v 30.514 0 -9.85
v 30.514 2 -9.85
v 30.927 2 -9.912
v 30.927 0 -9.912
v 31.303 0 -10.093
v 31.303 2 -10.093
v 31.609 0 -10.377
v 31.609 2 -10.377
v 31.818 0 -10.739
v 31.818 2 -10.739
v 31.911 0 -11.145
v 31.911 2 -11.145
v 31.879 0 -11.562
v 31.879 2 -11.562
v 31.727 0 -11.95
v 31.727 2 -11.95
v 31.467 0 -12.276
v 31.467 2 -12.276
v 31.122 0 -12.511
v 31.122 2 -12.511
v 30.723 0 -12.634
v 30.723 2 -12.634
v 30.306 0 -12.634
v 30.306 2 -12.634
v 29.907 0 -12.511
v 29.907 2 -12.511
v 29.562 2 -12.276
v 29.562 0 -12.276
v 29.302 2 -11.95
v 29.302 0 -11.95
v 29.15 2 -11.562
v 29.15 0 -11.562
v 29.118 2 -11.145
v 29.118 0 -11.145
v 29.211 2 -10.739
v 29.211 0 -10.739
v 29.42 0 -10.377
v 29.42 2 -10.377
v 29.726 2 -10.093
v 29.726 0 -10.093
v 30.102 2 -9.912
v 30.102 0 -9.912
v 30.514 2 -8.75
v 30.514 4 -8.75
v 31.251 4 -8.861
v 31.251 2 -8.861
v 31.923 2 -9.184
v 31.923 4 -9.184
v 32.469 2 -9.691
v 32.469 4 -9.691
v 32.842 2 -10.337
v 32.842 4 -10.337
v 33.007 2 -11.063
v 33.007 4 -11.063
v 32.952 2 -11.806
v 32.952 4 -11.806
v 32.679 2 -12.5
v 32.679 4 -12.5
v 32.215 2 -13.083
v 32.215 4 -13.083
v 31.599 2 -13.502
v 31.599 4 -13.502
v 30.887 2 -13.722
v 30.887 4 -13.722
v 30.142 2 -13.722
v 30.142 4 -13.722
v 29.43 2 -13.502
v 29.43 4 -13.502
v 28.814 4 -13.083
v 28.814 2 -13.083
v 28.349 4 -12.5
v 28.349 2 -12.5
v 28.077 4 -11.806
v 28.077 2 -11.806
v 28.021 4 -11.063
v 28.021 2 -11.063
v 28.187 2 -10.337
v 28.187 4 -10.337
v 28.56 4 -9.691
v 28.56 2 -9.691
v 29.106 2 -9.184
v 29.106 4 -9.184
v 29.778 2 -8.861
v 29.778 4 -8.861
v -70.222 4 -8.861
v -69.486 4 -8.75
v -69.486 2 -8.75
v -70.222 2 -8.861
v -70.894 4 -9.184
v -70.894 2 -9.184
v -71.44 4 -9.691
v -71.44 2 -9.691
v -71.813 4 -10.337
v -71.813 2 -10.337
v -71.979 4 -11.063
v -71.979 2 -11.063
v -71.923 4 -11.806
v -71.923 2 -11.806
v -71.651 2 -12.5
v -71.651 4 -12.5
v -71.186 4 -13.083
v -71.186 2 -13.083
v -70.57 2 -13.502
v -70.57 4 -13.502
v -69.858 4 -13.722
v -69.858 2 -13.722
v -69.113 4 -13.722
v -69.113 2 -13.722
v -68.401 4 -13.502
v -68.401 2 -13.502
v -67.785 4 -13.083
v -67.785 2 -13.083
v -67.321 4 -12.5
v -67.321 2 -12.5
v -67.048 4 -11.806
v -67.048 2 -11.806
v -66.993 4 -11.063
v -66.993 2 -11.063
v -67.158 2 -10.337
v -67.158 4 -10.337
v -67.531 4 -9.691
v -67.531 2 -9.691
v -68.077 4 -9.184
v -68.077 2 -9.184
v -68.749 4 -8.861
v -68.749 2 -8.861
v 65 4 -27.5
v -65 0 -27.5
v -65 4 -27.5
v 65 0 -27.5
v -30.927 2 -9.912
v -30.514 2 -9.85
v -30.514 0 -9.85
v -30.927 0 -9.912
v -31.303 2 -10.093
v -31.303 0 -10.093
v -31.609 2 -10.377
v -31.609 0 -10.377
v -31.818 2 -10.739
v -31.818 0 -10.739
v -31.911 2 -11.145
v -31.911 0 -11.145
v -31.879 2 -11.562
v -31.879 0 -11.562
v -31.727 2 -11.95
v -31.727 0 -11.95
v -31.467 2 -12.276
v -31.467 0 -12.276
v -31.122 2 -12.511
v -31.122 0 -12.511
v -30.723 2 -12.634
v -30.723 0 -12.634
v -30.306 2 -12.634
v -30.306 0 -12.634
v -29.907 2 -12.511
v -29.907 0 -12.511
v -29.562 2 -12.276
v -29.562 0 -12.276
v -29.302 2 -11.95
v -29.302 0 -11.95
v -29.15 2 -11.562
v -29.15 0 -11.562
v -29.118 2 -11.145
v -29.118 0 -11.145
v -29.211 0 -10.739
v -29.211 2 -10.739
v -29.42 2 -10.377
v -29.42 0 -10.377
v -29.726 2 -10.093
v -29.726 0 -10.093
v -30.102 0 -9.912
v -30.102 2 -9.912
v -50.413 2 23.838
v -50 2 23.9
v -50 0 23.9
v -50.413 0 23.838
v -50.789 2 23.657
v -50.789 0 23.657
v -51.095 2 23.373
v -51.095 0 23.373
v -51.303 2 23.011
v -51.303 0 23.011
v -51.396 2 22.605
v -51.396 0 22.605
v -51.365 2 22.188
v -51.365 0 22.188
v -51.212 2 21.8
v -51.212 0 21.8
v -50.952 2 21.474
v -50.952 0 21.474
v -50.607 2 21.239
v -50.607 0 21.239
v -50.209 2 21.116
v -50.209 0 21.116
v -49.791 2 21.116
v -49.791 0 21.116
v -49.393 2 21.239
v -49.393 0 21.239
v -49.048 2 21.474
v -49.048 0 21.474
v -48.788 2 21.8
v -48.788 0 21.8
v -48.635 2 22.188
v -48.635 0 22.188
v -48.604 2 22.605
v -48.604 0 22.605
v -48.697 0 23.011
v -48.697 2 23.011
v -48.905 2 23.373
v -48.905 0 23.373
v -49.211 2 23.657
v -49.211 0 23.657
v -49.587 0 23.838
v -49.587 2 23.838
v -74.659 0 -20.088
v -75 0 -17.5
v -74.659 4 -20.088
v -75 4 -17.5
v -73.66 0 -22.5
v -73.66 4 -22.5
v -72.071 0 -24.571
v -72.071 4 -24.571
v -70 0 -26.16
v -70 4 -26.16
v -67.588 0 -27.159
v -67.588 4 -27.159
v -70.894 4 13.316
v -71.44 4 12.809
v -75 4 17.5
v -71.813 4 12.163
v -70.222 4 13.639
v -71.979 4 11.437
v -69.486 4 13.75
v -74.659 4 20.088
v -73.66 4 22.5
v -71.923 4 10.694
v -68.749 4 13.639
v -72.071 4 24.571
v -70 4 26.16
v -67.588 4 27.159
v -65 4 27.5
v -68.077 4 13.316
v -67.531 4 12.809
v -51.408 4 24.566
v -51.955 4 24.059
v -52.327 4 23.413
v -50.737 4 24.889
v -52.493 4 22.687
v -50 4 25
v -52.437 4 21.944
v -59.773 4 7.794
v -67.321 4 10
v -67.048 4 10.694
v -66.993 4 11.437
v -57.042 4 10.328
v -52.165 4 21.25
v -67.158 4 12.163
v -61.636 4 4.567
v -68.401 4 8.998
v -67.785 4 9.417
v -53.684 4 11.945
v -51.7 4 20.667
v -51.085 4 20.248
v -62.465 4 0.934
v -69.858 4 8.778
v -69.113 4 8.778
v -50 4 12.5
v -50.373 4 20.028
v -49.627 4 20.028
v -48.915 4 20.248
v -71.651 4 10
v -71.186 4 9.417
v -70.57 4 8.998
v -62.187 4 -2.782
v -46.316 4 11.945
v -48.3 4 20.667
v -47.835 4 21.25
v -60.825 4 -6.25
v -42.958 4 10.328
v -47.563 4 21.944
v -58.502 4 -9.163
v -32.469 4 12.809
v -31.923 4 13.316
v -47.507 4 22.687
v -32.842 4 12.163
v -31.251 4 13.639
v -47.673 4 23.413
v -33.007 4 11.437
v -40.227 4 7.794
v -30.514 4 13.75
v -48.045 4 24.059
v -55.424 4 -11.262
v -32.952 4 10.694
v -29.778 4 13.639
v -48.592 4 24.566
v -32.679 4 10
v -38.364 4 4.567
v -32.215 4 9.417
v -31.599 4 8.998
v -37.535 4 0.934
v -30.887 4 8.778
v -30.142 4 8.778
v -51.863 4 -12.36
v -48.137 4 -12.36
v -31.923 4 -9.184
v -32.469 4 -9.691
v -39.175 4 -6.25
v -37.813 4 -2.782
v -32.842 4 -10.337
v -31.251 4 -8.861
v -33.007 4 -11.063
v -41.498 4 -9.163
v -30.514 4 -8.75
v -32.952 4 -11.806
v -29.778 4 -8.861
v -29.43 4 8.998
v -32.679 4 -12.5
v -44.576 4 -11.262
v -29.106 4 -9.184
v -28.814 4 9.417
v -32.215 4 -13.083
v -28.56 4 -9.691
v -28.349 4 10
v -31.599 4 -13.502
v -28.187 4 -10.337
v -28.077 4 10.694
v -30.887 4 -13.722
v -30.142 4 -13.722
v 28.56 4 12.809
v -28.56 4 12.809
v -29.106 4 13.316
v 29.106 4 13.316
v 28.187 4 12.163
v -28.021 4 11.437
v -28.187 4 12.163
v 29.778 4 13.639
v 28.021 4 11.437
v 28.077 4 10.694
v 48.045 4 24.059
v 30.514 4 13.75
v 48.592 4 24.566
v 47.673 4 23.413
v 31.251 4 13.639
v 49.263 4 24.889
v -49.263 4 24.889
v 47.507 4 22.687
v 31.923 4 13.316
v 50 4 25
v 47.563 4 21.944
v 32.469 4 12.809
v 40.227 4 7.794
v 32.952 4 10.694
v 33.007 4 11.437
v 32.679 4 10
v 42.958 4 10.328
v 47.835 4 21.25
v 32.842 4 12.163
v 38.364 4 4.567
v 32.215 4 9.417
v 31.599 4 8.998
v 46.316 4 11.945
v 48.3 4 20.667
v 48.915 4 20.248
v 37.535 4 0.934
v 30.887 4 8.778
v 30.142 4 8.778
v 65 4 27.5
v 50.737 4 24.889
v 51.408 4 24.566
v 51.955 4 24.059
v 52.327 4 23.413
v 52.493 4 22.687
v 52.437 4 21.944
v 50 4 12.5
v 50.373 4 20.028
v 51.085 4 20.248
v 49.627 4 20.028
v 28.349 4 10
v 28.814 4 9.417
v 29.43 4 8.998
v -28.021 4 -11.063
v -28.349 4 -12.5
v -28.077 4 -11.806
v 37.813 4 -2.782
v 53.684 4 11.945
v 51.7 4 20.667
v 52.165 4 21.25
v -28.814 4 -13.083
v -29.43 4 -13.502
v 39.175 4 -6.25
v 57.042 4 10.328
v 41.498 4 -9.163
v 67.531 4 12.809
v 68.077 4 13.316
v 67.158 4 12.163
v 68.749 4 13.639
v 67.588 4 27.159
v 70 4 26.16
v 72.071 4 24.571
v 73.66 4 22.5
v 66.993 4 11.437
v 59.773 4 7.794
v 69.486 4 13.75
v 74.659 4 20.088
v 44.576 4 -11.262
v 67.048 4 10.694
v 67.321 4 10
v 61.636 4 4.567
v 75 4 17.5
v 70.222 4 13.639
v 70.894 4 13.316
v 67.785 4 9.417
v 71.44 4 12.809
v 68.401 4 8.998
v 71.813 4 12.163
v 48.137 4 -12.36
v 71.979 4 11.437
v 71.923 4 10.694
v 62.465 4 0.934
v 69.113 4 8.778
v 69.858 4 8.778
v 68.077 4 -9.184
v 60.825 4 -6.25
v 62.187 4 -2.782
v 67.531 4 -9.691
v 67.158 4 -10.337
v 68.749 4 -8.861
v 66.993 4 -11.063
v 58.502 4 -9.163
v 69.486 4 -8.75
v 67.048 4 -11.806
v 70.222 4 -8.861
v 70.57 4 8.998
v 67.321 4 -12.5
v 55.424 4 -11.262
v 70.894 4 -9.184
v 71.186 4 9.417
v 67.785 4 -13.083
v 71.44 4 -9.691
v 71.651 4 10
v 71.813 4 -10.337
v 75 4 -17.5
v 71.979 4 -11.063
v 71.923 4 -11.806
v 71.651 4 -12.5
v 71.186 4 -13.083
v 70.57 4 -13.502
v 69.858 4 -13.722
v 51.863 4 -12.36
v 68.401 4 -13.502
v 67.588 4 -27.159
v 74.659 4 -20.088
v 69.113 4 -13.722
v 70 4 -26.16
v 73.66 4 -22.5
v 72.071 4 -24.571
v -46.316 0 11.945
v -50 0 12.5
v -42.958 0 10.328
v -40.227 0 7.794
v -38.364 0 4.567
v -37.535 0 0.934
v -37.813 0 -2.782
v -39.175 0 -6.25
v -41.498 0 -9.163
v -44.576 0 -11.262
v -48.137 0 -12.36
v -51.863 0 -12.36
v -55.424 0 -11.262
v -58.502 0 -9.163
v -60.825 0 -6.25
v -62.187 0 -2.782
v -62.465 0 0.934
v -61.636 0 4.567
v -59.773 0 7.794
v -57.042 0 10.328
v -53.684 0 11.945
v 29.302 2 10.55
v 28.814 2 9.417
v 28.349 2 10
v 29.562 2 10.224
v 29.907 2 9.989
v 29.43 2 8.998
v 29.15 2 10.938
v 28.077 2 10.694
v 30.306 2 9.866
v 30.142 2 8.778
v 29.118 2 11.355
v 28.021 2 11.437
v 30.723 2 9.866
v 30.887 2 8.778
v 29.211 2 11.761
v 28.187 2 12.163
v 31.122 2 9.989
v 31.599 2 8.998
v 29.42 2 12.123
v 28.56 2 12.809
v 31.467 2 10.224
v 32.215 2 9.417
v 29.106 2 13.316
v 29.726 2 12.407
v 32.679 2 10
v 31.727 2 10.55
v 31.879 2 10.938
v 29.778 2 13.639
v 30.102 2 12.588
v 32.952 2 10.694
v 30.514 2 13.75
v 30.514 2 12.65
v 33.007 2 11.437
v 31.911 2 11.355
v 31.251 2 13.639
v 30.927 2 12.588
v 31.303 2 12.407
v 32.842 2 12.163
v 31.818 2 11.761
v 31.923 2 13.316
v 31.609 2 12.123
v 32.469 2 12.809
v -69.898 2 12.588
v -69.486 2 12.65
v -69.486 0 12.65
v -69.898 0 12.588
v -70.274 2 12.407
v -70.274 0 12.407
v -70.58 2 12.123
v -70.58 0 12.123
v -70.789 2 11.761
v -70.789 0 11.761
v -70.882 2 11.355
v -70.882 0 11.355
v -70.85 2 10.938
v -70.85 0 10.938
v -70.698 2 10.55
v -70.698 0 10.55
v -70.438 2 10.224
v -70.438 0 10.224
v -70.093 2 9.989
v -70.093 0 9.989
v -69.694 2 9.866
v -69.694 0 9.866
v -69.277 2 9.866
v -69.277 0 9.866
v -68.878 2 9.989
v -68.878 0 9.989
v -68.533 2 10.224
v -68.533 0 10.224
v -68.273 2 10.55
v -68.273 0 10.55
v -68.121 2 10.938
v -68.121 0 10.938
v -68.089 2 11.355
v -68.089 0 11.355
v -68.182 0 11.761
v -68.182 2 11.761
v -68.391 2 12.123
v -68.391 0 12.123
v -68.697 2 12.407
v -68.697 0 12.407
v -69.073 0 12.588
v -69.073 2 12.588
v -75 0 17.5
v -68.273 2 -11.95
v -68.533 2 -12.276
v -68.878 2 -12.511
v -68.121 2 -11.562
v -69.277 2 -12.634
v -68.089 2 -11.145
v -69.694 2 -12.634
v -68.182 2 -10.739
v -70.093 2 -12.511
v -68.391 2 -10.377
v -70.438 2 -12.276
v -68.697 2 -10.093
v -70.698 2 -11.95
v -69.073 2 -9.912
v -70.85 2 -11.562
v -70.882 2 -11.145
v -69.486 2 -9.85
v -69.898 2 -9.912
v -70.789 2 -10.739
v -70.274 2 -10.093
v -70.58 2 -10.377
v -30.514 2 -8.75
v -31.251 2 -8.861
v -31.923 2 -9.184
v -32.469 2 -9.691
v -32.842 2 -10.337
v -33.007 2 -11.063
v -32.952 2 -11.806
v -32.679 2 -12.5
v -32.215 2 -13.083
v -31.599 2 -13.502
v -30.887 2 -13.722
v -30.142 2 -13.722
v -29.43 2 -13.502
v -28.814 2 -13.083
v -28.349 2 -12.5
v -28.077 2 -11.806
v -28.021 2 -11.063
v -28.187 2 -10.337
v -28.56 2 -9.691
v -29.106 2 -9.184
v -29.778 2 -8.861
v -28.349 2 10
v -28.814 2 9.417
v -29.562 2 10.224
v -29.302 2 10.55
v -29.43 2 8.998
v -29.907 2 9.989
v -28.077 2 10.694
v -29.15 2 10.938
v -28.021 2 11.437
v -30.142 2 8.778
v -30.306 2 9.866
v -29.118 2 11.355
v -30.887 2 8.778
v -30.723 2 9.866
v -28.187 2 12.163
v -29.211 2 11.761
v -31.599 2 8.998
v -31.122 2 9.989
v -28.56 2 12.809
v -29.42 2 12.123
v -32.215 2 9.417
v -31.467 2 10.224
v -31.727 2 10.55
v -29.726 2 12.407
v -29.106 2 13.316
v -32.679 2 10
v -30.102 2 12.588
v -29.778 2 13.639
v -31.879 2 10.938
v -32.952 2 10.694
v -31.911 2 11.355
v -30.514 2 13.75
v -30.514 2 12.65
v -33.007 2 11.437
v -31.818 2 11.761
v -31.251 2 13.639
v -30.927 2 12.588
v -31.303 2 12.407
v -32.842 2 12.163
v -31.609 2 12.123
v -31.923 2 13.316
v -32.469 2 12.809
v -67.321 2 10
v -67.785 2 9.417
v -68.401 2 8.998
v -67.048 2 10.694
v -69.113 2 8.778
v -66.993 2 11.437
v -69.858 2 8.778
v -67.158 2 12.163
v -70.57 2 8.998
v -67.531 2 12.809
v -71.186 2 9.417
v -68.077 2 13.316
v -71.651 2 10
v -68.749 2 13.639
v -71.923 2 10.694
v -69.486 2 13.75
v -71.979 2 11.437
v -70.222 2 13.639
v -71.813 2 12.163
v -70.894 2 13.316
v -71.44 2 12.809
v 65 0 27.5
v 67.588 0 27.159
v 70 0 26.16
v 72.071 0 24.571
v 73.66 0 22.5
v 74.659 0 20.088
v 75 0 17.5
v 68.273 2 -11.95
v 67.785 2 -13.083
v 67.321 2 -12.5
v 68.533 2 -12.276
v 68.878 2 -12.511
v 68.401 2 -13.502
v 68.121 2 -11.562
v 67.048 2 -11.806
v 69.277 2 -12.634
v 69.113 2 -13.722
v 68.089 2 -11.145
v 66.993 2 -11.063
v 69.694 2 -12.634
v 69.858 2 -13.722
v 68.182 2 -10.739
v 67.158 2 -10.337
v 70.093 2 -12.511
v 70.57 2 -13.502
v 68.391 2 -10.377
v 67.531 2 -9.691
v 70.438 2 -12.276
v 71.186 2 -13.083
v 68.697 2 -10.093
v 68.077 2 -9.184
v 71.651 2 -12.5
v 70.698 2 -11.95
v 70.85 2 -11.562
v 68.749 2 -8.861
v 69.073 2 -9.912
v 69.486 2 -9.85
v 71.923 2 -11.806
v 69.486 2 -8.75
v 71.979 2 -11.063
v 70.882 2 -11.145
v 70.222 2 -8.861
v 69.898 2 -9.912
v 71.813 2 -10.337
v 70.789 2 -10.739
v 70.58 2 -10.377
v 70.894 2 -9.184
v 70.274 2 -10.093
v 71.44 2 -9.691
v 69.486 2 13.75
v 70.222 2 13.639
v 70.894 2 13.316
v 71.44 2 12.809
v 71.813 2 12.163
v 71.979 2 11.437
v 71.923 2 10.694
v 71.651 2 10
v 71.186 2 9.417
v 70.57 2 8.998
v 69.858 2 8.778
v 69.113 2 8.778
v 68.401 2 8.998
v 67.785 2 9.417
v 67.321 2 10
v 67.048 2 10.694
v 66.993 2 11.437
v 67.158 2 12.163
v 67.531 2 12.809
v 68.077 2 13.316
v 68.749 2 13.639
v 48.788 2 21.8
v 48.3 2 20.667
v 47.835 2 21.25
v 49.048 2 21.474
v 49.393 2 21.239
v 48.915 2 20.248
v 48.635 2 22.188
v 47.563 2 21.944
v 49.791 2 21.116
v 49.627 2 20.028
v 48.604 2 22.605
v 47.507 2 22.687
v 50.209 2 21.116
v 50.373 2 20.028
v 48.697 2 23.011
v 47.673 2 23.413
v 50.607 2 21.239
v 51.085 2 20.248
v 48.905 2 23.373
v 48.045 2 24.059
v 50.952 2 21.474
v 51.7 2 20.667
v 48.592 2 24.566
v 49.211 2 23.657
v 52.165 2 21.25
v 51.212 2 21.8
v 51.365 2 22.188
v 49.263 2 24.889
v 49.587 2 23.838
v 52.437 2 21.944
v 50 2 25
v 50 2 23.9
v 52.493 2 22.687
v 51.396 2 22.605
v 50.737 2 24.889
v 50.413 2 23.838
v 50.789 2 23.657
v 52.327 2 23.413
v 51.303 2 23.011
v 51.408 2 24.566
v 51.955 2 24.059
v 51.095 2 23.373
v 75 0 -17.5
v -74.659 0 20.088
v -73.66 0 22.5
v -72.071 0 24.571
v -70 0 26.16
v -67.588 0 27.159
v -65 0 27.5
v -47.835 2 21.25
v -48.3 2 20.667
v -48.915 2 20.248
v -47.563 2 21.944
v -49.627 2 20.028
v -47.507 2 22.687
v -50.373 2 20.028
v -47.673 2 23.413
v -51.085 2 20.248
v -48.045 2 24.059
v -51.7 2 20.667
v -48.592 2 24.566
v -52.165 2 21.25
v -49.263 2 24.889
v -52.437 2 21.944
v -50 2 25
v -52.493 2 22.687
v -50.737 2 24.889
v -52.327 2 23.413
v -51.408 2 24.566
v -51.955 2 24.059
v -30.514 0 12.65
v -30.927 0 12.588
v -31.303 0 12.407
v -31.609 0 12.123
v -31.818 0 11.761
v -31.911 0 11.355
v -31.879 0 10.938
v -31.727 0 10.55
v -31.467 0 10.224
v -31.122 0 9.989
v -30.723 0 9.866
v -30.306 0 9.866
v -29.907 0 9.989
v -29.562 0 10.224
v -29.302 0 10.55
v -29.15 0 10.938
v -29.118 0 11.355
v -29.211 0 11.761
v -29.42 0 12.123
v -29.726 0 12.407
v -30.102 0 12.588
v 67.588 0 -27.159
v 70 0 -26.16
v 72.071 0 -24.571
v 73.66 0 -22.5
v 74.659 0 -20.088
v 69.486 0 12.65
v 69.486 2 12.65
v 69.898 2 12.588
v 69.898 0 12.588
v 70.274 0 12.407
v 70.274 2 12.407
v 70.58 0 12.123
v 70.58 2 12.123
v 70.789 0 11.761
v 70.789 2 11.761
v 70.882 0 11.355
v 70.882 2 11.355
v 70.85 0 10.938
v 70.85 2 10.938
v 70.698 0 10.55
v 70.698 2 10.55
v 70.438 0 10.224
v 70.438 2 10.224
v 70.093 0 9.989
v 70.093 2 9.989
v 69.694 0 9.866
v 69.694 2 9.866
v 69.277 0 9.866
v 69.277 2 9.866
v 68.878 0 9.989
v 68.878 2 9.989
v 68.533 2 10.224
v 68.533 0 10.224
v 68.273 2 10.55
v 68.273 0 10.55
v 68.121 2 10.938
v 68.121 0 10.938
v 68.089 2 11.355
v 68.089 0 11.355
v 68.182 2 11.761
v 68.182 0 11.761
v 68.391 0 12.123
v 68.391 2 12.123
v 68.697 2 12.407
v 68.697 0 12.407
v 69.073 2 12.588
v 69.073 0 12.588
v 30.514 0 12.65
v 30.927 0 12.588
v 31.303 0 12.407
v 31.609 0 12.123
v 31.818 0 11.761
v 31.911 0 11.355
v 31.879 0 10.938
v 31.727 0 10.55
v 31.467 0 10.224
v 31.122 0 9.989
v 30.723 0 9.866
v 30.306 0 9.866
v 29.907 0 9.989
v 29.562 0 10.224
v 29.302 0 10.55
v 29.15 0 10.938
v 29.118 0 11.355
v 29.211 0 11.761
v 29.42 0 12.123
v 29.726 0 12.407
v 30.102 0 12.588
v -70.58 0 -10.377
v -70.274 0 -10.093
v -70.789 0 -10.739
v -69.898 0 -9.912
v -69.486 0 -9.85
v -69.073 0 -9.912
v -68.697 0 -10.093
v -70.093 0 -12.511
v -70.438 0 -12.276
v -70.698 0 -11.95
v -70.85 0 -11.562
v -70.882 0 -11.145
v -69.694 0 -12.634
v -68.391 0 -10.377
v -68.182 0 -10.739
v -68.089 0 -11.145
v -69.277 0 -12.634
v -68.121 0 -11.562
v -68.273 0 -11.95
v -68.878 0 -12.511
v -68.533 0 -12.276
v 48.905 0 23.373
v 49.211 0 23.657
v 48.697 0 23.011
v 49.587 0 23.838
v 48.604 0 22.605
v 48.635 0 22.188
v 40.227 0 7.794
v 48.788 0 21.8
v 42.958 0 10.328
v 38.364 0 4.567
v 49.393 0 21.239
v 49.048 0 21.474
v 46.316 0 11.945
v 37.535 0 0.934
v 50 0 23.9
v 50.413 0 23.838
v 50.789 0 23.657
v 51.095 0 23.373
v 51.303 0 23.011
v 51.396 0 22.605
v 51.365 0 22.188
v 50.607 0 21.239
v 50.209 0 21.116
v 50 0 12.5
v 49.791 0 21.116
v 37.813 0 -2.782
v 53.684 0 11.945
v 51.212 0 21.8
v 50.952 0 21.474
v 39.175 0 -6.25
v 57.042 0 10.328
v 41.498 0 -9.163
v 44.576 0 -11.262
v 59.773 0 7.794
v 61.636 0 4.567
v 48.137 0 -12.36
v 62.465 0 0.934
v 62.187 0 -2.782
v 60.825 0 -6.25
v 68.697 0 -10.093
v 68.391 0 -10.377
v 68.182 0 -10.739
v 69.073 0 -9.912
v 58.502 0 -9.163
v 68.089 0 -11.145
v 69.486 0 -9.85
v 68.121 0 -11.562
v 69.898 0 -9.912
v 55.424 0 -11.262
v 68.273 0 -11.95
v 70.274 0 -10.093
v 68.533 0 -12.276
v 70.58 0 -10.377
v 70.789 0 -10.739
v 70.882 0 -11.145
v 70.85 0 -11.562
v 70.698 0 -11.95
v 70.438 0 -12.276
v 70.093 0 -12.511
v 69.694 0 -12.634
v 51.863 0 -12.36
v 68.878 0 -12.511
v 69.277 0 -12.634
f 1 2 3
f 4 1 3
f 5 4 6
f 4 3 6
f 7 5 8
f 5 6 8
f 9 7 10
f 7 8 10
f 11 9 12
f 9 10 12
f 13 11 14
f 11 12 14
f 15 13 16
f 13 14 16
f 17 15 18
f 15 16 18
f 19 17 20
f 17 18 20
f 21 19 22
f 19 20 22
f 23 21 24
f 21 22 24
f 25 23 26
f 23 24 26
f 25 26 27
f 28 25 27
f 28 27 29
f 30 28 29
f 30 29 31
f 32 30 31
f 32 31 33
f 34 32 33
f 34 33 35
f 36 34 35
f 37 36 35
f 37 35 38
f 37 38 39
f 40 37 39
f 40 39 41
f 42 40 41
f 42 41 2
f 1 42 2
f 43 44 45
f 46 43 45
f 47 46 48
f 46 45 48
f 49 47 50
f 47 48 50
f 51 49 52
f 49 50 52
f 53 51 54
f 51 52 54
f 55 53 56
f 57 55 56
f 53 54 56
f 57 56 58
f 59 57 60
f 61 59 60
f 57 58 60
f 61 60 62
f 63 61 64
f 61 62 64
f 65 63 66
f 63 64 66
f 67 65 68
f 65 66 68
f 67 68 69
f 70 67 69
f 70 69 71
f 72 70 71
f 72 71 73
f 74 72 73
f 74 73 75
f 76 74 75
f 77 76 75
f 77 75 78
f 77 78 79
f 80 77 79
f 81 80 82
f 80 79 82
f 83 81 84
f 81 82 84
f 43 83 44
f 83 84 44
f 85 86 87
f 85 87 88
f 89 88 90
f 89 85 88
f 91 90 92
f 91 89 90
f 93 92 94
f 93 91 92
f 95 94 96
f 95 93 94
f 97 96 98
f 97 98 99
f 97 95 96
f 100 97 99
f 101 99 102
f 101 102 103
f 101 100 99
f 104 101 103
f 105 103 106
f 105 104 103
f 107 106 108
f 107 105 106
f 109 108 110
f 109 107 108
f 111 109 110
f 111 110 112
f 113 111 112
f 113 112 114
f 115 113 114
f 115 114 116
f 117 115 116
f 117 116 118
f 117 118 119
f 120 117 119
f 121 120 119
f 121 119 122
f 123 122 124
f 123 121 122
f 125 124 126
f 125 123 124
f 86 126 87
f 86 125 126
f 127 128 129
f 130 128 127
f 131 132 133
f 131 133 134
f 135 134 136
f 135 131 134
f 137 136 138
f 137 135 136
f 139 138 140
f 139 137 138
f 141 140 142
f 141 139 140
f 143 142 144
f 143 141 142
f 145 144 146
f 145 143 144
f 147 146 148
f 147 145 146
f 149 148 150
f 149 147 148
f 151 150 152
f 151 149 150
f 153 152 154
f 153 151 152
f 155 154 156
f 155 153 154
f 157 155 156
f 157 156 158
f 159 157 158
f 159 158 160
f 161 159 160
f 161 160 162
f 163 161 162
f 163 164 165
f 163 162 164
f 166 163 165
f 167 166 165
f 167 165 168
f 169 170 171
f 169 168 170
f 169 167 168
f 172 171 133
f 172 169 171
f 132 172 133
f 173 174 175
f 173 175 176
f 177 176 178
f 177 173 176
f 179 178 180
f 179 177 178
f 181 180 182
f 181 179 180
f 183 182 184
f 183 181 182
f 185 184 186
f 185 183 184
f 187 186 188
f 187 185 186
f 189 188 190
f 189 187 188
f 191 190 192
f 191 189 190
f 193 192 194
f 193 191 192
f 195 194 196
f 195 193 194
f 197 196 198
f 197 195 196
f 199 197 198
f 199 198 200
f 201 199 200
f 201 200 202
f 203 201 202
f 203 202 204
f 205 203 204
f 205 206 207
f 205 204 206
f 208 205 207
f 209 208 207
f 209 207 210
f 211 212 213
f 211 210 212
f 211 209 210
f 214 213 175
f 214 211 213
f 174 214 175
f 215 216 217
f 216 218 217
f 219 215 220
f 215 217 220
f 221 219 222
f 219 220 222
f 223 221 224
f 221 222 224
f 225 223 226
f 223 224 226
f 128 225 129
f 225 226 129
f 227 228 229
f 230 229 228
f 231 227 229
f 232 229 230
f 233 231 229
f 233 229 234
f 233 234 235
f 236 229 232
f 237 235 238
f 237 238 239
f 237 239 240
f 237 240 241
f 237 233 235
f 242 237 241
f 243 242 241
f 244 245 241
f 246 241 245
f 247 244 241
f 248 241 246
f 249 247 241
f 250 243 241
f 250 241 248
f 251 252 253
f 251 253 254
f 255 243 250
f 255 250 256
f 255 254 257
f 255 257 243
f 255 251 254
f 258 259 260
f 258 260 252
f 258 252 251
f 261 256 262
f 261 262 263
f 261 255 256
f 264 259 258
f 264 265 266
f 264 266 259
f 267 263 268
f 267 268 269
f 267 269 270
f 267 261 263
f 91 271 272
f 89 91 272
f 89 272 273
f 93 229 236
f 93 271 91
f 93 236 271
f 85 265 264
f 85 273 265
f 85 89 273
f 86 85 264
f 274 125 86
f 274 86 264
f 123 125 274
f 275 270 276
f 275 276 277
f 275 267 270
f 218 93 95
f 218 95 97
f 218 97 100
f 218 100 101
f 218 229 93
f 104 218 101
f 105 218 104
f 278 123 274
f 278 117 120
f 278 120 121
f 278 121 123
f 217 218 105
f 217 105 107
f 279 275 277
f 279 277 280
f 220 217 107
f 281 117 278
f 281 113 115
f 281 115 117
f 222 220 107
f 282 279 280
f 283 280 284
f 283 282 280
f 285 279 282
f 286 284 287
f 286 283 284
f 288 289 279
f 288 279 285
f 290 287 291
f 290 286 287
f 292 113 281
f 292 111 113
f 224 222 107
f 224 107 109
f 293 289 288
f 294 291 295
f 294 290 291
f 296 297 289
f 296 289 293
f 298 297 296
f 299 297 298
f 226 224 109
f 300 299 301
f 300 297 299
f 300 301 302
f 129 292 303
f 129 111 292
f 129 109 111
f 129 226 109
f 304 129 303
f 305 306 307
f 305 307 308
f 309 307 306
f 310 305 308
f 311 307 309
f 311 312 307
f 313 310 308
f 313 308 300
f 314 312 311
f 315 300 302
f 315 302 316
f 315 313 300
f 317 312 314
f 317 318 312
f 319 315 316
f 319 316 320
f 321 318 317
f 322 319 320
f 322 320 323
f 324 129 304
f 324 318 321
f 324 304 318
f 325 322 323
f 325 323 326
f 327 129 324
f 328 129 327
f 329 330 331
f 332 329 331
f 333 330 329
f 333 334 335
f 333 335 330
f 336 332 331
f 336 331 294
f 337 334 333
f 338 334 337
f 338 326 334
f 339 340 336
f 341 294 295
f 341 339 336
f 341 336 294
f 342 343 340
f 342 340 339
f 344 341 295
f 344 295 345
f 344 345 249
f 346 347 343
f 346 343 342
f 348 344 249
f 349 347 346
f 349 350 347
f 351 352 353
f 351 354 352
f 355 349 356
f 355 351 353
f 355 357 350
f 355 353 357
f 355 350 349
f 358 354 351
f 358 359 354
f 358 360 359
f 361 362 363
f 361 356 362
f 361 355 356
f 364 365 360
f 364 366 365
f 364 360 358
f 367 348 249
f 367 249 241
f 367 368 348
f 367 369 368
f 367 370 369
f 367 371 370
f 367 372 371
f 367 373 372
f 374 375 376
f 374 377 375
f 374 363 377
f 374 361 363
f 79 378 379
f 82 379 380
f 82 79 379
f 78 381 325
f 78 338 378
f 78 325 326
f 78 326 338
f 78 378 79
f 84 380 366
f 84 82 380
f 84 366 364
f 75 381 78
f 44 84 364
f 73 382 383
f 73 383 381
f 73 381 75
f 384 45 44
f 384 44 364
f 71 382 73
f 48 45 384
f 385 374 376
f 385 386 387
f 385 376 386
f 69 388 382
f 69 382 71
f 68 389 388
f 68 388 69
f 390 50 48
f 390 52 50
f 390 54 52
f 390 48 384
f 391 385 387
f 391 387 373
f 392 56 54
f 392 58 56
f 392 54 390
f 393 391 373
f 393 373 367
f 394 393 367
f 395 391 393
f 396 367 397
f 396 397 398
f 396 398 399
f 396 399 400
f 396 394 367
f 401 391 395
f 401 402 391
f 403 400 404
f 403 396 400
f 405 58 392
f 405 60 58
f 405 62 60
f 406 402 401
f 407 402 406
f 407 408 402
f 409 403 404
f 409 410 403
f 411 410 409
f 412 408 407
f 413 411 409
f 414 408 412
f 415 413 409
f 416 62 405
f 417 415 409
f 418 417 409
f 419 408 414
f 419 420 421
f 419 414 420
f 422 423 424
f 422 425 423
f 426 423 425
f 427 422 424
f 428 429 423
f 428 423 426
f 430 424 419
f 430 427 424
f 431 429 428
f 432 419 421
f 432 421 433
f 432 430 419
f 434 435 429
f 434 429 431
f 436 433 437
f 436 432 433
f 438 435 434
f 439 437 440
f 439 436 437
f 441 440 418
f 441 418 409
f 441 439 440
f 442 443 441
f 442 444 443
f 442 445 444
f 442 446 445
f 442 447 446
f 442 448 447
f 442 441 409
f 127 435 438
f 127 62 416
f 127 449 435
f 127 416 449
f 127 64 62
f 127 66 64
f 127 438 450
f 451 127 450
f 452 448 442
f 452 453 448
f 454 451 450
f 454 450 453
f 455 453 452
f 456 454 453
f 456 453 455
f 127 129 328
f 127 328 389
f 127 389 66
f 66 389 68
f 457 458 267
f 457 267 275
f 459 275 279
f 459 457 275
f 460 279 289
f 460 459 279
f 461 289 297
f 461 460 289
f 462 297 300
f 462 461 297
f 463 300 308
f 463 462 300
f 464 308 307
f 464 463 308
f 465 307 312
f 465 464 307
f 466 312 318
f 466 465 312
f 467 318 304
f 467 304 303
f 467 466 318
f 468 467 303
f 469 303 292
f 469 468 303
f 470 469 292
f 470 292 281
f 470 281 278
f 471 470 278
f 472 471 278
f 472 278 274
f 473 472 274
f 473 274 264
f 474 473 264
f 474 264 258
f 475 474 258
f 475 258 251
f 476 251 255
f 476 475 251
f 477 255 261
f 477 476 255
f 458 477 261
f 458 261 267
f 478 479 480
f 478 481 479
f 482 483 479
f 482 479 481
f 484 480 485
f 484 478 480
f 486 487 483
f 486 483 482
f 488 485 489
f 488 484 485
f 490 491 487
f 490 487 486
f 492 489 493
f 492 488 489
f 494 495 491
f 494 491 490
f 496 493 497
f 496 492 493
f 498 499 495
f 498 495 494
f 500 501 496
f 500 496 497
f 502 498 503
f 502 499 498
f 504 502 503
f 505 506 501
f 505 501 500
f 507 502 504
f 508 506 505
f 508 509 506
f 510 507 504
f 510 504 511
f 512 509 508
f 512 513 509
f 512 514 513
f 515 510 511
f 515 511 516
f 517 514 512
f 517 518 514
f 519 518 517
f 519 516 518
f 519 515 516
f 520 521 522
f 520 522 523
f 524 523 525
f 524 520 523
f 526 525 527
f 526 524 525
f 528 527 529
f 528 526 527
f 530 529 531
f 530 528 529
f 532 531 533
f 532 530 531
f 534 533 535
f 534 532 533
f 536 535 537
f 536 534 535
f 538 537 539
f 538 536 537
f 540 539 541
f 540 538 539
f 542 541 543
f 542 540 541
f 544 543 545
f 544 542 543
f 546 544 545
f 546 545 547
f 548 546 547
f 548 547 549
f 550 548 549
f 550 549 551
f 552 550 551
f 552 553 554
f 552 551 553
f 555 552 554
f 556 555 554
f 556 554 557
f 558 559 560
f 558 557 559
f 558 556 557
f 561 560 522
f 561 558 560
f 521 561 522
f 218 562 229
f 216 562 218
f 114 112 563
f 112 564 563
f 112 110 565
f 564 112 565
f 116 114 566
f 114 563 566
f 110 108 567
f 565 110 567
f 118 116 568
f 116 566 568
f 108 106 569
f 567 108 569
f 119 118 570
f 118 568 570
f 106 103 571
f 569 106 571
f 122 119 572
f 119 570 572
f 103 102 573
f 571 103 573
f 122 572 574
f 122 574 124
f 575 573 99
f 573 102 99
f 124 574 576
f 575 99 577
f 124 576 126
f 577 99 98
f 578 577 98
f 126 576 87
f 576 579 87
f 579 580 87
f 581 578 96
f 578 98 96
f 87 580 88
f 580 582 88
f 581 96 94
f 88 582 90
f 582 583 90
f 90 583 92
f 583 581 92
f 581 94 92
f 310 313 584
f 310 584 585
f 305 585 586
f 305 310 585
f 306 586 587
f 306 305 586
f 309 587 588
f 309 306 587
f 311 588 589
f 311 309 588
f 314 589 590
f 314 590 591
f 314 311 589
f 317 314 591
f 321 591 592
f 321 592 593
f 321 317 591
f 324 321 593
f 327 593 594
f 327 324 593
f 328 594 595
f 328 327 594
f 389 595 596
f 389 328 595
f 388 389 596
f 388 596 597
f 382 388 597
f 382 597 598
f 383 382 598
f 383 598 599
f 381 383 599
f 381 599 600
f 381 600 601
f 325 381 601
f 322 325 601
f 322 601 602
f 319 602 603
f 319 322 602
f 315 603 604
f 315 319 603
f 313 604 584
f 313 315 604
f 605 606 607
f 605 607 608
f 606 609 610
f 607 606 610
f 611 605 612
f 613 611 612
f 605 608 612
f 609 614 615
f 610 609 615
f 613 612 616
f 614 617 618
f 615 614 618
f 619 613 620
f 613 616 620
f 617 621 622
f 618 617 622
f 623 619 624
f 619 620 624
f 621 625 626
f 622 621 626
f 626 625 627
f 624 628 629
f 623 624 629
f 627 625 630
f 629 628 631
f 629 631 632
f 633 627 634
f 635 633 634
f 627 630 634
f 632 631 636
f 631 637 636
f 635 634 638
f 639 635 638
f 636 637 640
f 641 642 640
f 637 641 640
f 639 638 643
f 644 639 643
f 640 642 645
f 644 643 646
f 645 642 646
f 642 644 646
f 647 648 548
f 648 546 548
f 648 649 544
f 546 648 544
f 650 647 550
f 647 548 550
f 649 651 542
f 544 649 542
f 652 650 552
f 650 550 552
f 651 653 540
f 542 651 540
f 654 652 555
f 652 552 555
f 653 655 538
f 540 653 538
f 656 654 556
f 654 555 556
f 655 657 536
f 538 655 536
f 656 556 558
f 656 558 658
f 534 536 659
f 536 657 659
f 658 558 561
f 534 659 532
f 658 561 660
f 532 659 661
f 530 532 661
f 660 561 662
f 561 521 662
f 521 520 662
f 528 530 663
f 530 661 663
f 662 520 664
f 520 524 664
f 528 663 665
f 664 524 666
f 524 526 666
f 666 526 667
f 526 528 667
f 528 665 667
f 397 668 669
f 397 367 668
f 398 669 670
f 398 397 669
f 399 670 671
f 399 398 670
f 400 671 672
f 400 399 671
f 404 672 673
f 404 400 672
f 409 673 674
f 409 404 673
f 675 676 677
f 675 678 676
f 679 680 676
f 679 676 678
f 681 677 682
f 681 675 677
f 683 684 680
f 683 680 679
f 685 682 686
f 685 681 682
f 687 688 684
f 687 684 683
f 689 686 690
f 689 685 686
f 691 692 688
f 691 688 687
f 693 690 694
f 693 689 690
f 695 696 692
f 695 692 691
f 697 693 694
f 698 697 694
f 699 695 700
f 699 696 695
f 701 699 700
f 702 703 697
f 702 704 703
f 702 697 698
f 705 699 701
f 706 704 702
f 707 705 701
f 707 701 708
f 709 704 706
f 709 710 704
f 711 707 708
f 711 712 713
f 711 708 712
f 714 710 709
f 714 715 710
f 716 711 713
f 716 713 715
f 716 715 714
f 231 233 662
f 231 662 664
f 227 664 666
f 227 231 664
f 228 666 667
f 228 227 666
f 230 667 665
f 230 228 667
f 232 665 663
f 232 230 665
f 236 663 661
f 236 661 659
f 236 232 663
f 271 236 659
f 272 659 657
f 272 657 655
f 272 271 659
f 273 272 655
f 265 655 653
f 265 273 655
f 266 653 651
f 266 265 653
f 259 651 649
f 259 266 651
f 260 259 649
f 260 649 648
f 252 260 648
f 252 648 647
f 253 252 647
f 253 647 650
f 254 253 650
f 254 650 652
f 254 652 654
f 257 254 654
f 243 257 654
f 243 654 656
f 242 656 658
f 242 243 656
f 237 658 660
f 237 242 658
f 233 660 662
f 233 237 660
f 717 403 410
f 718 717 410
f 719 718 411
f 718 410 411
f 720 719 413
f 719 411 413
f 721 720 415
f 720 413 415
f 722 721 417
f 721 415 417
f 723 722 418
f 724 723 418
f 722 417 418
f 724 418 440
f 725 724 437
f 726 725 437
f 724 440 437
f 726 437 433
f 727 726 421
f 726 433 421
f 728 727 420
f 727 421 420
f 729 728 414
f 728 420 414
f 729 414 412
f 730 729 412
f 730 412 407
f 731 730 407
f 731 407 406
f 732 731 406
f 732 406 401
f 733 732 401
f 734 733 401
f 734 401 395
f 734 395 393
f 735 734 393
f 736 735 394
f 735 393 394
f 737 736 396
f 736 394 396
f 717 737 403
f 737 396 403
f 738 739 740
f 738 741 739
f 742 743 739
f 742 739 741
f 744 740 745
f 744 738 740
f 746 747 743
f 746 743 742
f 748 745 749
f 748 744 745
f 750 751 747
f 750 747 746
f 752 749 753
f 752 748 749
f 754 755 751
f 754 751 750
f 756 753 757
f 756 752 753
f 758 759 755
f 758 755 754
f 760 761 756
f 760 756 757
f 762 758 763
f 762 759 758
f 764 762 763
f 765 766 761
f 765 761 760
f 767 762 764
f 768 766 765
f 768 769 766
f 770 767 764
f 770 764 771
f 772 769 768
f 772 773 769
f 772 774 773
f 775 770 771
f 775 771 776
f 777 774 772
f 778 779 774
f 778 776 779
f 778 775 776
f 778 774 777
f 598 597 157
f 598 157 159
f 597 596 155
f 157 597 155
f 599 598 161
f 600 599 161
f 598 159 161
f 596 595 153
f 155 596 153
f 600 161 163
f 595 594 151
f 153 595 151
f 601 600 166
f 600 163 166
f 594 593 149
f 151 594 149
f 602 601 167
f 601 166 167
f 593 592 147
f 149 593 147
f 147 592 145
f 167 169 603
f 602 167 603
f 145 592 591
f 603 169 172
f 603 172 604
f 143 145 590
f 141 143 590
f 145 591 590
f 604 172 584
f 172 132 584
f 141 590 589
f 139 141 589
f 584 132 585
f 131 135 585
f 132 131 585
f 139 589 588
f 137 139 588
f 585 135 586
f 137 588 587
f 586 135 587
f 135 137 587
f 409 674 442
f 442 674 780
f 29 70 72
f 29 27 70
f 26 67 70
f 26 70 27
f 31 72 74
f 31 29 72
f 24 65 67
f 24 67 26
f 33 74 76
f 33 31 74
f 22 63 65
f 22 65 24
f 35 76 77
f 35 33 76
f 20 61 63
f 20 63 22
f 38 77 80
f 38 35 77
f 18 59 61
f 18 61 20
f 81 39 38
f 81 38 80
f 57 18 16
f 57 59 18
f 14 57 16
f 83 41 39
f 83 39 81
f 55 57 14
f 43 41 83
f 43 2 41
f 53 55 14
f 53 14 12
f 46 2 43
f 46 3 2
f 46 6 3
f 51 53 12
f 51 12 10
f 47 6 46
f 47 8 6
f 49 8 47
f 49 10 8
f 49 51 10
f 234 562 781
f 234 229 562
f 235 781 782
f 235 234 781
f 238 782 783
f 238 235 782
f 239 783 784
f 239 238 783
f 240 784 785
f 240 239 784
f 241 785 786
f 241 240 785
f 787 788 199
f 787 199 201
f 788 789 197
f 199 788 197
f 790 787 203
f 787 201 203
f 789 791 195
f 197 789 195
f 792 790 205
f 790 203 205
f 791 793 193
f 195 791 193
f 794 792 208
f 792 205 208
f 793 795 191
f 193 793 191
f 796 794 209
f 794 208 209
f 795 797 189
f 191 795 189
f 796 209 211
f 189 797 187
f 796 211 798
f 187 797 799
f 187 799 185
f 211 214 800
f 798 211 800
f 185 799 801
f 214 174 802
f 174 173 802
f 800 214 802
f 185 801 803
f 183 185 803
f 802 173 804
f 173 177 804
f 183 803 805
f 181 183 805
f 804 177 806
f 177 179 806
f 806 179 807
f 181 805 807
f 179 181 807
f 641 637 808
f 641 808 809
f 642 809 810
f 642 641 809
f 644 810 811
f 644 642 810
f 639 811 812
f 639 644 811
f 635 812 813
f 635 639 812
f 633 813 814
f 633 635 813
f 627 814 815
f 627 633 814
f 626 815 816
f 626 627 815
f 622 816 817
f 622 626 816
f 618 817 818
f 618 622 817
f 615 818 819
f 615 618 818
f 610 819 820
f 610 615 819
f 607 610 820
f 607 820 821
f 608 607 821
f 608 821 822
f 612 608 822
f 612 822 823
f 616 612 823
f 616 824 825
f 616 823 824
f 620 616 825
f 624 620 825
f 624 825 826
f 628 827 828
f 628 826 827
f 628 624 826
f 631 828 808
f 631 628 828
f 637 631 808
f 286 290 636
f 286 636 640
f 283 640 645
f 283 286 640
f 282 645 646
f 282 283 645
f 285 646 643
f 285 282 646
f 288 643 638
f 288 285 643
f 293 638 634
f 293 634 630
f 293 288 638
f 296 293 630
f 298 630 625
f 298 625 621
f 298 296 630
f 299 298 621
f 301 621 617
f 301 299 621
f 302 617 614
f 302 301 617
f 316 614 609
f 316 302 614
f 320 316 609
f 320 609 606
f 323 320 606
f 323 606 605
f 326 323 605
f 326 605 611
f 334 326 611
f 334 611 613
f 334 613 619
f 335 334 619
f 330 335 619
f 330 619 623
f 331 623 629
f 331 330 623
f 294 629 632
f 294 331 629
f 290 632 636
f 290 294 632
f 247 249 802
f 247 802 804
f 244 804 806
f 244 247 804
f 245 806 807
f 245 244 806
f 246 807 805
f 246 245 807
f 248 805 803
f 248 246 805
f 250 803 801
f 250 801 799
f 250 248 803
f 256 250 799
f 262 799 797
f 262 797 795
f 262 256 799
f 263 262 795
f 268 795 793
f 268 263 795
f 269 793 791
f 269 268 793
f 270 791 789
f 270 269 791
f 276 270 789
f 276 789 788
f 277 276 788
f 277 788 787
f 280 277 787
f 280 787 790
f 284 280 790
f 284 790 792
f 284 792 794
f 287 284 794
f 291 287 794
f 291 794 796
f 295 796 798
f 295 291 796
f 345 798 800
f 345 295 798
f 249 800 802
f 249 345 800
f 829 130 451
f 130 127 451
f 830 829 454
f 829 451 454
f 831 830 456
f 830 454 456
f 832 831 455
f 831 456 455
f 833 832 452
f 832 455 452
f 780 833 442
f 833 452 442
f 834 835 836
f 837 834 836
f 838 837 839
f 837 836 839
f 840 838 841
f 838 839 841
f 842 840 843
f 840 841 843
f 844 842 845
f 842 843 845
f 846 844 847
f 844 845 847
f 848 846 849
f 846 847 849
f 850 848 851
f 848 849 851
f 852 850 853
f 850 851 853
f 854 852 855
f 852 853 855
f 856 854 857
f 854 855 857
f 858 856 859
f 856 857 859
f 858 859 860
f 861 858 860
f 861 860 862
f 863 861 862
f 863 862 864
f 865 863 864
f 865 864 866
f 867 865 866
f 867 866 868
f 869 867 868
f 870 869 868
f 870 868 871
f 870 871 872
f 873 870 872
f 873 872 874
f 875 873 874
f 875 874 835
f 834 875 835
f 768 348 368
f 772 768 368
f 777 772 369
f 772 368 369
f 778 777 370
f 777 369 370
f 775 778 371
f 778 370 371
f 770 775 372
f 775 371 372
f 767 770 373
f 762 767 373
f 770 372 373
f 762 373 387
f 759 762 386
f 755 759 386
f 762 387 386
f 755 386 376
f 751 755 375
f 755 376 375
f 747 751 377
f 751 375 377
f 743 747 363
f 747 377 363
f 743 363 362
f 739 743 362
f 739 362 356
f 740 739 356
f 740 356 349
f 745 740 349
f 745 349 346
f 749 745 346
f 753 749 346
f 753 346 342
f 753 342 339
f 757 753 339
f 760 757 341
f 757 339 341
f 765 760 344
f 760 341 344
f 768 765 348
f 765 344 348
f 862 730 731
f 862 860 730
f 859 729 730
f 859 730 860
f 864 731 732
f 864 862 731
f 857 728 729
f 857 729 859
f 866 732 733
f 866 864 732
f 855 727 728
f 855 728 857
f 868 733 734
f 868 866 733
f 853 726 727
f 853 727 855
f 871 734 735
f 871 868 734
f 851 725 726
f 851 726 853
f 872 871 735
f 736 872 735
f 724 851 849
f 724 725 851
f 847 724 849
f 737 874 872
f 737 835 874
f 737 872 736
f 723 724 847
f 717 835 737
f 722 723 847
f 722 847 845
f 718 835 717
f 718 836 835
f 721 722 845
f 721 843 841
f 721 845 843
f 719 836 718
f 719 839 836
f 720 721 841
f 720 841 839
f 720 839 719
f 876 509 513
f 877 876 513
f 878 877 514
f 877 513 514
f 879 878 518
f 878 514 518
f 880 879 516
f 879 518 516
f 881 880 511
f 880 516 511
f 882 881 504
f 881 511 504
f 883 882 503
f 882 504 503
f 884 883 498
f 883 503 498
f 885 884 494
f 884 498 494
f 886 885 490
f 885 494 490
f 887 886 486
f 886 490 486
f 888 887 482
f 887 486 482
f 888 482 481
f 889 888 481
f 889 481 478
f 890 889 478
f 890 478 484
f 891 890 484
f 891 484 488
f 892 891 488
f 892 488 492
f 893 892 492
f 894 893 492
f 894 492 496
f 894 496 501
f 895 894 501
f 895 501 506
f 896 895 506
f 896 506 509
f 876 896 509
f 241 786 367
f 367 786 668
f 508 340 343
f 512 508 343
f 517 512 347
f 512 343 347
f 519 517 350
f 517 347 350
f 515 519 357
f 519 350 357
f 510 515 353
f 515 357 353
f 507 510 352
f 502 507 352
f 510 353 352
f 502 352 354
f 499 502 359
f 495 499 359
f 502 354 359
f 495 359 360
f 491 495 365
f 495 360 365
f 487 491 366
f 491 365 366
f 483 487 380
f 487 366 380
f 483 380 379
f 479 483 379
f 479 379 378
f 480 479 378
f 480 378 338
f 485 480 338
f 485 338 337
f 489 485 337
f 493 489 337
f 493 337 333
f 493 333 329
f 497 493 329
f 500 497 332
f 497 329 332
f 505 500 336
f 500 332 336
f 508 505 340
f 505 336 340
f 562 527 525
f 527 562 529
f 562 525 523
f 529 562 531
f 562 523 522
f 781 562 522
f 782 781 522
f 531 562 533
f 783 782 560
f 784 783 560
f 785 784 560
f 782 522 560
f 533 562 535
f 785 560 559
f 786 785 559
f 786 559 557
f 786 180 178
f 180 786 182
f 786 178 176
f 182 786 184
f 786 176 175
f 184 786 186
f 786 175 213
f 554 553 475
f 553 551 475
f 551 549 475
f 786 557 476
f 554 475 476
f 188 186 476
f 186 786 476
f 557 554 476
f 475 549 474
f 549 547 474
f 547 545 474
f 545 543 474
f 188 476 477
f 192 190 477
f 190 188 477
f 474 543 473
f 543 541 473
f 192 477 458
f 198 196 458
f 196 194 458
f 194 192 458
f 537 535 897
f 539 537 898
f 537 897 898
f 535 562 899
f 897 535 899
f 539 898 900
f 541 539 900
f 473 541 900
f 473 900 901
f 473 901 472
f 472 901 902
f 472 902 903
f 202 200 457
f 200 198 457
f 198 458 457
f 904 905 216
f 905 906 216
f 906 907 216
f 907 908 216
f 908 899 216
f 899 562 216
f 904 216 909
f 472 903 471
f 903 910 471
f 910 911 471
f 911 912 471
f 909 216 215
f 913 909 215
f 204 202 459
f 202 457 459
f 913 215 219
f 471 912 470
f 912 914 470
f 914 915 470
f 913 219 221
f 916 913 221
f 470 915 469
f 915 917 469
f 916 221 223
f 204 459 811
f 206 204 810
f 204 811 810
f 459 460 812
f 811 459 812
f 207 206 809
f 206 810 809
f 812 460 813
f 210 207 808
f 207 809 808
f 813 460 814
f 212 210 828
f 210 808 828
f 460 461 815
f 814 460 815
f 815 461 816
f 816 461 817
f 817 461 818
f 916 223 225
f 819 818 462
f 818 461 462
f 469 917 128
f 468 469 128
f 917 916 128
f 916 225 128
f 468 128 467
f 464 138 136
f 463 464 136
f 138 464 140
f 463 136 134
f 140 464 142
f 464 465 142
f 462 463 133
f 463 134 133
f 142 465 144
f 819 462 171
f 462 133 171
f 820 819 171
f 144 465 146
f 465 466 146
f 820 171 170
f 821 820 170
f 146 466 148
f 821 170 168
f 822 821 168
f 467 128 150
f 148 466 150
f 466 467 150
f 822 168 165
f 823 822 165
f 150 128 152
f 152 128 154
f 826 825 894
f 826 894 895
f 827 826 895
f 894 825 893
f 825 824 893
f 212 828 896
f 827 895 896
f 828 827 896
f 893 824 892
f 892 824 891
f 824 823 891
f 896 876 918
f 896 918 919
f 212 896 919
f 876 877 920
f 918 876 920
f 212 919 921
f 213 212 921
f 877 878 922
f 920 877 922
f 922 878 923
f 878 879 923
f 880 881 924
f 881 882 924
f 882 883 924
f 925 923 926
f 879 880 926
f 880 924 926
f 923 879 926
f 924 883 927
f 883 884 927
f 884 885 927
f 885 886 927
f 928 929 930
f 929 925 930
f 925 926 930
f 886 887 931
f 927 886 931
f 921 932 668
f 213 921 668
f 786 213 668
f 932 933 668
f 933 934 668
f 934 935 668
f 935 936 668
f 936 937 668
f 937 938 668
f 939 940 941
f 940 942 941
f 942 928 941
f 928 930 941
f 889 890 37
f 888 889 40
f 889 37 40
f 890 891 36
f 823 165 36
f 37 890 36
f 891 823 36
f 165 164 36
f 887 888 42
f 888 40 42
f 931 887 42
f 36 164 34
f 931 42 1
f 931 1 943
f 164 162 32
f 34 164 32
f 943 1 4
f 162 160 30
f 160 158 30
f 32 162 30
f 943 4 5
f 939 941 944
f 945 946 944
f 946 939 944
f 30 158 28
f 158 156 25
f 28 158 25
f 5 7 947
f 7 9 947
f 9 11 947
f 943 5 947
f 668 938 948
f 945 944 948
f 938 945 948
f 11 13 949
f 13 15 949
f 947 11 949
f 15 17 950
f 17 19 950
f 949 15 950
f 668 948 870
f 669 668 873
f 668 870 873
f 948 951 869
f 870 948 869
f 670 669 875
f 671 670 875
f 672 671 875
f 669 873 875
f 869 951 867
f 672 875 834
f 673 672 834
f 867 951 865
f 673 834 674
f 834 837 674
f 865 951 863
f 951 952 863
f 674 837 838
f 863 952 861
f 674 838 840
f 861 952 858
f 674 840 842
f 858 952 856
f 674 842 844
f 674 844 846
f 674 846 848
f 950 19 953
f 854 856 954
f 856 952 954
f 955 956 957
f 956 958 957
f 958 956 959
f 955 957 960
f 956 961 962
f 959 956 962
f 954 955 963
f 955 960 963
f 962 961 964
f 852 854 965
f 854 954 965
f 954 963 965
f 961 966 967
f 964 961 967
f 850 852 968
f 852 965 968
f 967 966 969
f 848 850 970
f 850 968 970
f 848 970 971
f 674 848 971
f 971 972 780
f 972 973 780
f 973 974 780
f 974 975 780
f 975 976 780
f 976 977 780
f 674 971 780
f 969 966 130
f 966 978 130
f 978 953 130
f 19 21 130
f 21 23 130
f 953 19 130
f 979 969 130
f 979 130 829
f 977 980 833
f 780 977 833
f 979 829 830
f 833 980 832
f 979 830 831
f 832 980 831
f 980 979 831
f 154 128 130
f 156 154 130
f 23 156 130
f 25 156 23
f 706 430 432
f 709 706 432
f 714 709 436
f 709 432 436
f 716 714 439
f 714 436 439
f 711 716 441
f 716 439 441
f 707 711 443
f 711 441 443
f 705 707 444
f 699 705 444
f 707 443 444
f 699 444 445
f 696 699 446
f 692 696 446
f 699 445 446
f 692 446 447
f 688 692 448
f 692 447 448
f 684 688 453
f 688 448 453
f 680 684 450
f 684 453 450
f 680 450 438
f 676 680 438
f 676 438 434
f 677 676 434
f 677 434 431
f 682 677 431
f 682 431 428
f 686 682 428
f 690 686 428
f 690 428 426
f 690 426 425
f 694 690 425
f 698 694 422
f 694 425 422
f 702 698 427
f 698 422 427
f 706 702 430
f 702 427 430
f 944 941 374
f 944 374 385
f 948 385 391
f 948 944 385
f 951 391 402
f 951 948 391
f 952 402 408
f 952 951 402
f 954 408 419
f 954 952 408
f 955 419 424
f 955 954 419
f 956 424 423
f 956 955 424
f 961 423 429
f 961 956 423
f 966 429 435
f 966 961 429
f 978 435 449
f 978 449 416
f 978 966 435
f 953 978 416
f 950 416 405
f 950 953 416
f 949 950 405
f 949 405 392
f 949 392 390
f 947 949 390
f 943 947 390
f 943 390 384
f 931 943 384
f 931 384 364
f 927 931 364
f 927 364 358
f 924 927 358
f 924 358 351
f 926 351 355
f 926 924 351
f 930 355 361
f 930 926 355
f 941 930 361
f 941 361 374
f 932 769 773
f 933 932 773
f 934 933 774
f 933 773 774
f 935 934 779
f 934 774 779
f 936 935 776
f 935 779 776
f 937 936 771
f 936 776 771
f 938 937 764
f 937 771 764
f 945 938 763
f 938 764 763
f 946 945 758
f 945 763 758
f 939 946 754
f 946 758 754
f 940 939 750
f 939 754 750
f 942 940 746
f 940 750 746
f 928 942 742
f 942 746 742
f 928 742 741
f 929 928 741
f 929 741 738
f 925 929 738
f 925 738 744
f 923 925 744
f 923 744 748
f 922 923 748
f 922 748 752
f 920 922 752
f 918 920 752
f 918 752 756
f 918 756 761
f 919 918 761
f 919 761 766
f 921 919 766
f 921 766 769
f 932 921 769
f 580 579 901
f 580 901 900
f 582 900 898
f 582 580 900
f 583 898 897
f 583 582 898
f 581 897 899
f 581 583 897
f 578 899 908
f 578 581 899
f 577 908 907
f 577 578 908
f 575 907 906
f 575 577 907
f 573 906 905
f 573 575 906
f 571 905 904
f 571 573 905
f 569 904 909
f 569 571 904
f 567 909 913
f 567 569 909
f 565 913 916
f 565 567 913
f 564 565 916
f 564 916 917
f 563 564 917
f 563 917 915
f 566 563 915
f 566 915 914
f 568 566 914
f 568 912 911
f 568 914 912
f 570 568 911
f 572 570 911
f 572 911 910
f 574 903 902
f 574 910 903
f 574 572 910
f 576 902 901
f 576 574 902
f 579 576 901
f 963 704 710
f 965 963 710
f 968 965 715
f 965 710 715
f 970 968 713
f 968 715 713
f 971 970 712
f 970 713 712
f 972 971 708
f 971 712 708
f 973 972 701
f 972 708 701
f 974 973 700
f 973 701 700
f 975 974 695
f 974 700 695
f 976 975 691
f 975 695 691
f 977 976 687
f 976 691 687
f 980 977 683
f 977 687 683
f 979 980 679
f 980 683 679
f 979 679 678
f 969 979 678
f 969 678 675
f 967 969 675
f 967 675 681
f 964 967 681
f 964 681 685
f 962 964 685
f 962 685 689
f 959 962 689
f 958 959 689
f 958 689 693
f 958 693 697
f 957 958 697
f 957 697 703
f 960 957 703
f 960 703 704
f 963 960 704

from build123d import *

# Parameters (mm, degrees)
SKETCH1_W           = 150
SKETCH1_H           = 55
SKETCH1_R           = 12.5
BOSS_EXTRUDE1_DEPTH = 4
SKETCH2_R           = 1.4
CUT_EXTRUDE1_DEPTH  = 80.982810653
SKETCH3_R           = 2.5
CUT_EXTRUDE3_DEPTH  = 2
FILLET1_R           = 10


with BuildPart() as part:
    # Sketch1 → Boss-Extrude1 (new body)
    with BuildSketch(Plane(origin=(0, 0, 0), x_dir=(1, 0, 0), z_dir=(0, 1, 0))):
        Rectangle(SKETCH1_W, SKETCH1_H)
        with Locations(Location((-50, 0, 0), (0, 0, 270))):
            Circle(SKETCH1_R, mode=Mode.SUBTRACT)
        with Locations(Location((50, 0, 0), (0, 0, 270))):
            Circle(SKETCH1_R, mode=Mode.SUBTRACT)
    extrude(amount=BOSS_EXTRUDE1_DEPTH)

    # Sketch2 → Cut-Extrude1 (cut, through all)
    with BuildSketch(Plane(origin=(0, 4, 0), x_dir=(1, 0, 0), z_dir=(0, 1, 0))):
        with Locations(Location((30.514428415, 11.25, 0), (0, 0, 270))):
            Circle(SKETCH2_R)
        with Locations(Location((69.485571585, 11.25, 0), (0, 0, 270))):
            Circle(SKETCH2_R)
        with Locations(Location((69.485571585, -11.25, 0), (0, 0, 270))):
            Circle(SKETCH2_R)
        with Locations(Location((30.514428415, -11.25, 0), (0, 0, 270))):
            Circle(SKETCH2_R)
        with Locations(Location((50, -22.5, 0), (0, 0, 270))):
            Circle(SKETCH2_R)
    cut_extrude1 = extrude(amount=-CUT_EXTRUDE1_DEPTH, mode=Mode.SUBTRACT)

    # Sketch3 → Cut-Extrude3 (cut)
    with BuildSketch(Plane(origin=(0, 4, 0), x_dir=(1, 0, 0), z_dir=(0, 1, 0))):
        with Locations(Location((30.514428415, 11.25, 0), (0, 0, 270))):
            Circle(SKETCH3_R)
        with Locations(Location((30.514428415, -11.25, 0), (0, 0, 270))):
            Circle(SKETCH3_R)
        with Locations(Location((50, -22.5, 0), (0, 0, 270))):
            Circle(SKETCH3_R)
        with Locations(Location((69.485571585, -11.25, 0), (0, 0, 270))):
            Circle(SKETCH3_R)
        with Locations(Location((69.485571585, 11.25, 0), (0, 0, 270))):
            Circle(SKETCH3_R)
    cut_extrude3 = extrude(amount=-CUT_EXTRUDE3_DEPTH, mode=Mode.SUBTRACT)

    # Mirror1: Cut-Extrude1, Cut-Extrude3 across plane
    add(cut_extrude1.mirror(Plane(origin=(0, 0, 0), x_dir=(0, 0, 1), z_dir=(1, 0, 0))), mode=Mode.SUBTRACT)
    add(cut_extrude3.mirror(Plane(origin=(0, 0, 0), x_dir=(0, 0, 1), z_dir=(1, 0, 0))), mode=Mode.SUBTRACT)

    # Fillet1
    fillet1_edges = [part.edges().sort_by_distance(p)[0] for p in [
        (-75, 2, -27.5),
        (75, 2, -27.5),
        (75, 2, 27.5),
        (-75, 2, 27.5),
    ]]
    fillet(fillet1_edges, radius=FILLET1_R)


solid = part.part
